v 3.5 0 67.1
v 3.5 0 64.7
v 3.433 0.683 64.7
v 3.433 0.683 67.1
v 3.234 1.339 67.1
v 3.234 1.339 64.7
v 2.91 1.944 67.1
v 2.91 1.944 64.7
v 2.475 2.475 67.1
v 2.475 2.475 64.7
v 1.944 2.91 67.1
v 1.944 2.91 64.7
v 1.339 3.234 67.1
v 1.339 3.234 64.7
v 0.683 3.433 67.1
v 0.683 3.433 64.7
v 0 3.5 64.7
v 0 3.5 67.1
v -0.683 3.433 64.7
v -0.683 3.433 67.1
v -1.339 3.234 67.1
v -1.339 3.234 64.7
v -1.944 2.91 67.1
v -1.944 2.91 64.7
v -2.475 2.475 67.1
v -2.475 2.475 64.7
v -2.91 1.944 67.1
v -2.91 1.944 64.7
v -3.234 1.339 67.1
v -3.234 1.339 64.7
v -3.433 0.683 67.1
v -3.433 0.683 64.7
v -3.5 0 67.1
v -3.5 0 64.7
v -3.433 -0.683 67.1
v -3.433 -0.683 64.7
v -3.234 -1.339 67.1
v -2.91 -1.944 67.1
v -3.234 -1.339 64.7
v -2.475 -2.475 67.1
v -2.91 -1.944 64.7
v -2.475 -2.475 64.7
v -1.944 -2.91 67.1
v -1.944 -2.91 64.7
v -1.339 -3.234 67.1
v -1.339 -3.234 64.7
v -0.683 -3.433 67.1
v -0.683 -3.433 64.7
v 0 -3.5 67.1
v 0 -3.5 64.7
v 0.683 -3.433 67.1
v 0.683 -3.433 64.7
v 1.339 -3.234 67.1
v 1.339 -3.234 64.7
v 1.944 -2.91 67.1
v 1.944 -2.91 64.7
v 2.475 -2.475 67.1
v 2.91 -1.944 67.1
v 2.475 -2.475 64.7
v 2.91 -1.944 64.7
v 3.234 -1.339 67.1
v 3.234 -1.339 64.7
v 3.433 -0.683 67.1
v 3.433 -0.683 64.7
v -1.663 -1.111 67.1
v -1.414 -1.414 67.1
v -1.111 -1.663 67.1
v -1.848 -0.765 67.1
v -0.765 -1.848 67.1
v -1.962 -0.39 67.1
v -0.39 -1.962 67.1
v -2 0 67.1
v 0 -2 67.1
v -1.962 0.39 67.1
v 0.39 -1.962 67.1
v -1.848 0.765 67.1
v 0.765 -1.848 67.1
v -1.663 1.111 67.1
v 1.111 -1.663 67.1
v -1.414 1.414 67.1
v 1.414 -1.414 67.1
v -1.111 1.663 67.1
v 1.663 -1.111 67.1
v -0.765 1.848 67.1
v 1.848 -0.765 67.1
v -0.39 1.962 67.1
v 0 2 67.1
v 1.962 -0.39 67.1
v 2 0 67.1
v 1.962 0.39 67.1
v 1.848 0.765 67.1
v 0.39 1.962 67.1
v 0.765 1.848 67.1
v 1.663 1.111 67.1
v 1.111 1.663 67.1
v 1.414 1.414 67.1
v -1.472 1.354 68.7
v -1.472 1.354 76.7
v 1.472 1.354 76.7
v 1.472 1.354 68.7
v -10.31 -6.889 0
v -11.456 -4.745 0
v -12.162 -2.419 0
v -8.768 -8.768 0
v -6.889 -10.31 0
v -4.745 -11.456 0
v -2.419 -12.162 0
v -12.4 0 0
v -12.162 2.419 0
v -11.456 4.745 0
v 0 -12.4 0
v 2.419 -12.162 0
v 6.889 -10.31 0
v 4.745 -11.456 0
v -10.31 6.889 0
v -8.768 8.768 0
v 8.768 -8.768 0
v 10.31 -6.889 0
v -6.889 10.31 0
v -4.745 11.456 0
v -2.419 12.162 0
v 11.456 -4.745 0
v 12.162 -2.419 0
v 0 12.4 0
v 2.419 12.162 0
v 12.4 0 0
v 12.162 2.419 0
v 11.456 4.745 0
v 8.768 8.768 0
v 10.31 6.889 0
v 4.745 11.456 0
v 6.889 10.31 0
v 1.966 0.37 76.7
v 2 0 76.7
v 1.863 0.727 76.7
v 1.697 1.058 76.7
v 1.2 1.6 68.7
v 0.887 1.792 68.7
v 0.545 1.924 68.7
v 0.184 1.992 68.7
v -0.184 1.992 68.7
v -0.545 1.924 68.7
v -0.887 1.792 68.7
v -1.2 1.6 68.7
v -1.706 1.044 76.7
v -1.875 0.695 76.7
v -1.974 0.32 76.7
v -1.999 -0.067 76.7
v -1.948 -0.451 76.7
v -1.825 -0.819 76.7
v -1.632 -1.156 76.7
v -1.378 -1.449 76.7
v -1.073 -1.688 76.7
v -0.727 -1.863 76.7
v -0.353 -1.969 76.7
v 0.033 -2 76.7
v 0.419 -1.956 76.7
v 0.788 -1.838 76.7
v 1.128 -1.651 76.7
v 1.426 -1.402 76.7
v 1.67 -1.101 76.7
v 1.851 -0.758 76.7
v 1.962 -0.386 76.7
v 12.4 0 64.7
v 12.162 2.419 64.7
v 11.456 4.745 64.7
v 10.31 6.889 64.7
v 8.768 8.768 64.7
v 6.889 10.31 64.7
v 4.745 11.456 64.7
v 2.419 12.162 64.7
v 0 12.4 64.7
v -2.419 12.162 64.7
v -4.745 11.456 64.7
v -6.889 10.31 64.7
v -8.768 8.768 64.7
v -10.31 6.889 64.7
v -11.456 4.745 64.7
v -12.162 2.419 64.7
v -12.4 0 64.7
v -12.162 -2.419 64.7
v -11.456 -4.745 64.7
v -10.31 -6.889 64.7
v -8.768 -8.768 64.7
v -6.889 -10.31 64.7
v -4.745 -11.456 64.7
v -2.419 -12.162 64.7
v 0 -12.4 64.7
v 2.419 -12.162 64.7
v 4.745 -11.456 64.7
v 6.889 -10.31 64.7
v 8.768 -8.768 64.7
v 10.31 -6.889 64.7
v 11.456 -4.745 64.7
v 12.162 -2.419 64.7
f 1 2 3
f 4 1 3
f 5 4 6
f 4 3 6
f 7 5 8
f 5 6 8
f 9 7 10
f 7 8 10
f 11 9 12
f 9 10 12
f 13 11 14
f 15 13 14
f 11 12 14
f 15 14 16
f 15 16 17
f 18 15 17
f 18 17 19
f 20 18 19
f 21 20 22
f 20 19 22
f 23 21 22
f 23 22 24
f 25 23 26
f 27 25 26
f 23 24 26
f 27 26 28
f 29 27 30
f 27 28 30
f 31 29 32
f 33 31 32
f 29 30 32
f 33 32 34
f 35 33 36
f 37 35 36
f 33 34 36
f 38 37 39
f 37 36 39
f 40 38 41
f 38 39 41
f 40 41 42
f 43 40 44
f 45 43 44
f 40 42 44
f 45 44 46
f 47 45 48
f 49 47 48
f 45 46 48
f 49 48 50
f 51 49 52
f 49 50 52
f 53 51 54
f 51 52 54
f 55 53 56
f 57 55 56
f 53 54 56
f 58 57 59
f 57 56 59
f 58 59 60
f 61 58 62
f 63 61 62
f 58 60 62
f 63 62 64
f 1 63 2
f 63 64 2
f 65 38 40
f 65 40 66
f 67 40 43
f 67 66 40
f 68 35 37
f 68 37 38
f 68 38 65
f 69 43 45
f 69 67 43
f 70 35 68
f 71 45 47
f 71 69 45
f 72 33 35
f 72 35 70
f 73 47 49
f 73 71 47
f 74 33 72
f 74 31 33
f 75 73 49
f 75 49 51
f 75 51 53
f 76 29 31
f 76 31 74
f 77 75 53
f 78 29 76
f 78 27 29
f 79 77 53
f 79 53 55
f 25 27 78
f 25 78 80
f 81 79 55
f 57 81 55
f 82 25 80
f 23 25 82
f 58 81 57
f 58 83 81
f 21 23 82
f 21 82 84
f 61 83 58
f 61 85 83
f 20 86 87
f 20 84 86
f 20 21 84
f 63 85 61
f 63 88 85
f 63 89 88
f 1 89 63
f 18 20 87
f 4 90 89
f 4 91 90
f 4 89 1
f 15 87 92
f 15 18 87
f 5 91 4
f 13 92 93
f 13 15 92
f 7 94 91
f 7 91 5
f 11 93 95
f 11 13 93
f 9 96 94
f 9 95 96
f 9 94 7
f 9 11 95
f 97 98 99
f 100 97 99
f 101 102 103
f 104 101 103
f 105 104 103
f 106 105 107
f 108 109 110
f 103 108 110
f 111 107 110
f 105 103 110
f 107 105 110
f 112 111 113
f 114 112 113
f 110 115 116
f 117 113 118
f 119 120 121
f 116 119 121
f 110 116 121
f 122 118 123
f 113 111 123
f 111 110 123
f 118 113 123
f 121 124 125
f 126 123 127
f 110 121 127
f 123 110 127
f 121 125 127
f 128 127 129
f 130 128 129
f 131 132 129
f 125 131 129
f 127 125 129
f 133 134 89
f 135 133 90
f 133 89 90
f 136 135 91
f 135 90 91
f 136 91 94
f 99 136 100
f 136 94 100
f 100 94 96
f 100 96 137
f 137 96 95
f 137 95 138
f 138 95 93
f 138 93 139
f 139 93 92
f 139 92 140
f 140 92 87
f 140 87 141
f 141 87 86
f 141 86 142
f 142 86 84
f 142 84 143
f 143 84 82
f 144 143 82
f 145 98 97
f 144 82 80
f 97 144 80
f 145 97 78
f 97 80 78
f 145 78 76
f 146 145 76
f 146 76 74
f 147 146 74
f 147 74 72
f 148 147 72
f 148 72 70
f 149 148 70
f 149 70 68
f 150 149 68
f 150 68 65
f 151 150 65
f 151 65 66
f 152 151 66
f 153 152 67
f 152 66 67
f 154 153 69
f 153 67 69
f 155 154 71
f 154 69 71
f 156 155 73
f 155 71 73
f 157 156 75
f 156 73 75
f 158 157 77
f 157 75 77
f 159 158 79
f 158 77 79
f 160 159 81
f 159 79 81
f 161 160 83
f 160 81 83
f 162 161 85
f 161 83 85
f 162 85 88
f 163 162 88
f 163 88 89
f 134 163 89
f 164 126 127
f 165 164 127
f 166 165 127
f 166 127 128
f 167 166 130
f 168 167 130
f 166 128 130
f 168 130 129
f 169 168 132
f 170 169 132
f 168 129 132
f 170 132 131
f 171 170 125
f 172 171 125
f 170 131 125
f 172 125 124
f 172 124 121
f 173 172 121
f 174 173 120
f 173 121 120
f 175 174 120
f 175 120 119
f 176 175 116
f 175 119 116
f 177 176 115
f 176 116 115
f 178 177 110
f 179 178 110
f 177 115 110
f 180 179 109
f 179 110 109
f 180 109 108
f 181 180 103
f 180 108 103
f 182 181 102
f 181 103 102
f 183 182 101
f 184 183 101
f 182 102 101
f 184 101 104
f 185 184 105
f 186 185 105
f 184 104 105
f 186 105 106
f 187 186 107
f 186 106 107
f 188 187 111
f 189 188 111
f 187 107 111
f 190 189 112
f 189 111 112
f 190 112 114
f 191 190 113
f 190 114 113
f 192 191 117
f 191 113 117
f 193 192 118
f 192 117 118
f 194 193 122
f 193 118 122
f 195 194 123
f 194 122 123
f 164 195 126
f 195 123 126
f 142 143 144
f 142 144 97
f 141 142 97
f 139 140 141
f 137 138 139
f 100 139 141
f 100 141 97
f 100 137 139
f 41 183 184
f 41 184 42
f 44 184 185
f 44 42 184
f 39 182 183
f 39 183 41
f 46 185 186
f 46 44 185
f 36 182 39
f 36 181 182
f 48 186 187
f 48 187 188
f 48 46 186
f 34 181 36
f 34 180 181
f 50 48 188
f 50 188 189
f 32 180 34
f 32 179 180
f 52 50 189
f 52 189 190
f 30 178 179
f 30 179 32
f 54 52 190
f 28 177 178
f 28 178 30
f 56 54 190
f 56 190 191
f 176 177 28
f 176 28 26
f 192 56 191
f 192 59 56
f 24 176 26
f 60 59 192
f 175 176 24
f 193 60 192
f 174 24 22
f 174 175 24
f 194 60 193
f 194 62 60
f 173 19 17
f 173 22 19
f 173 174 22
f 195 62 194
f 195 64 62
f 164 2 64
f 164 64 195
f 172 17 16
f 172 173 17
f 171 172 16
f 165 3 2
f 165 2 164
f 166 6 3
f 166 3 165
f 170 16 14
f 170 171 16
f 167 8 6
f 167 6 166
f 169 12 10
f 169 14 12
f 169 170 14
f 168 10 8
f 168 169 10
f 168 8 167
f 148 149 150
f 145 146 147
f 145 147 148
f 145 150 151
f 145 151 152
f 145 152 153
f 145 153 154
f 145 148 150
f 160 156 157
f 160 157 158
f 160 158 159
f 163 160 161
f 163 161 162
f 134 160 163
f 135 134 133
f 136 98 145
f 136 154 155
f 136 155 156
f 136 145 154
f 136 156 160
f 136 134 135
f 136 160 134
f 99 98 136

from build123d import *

# Parameters (mm, degrees)
SKETCH1_R           = 12.4
MAIN_EXTRUDE_DEPTH  = 64.7
SKETCH2_R           = 3.5
BOSS_EXTRUDE2_DEPTH = 2.4
SKETCH3_R           = 2
BOSS_EXTRUDE3_DEPTH = 9.6
KEY_CUT_DEPTH       = 8


with BuildPart() as part:
    # Sketch1 → Main Extrude (new body)
    with BuildSketch(Plane.XY):
        Circle(SKETCH1_R)
    extrude(amount=MAIN_EXTRUDE_DEPTH)

    # Sketch2 → Boss-Extrude2 (add)
    with BuildSketch(Plane.XY.offset(64.7)):
        Circle(SKETCH2_R)
    extrude(amount=BOSS_EXTRUDE2_DEPTH)

    # Sketch3 → Boss-Extrude3 (add)
    with BuildSketch(Plane.XY.offset(67.1)):
        Circle(SKETCH3_R)
    extrude(amount=BOSS_EXTRUDE3_DEPTH)

    # Sketch5 → Key Cut (cut)
    with BuildSketch(Plane.XY.offset(76.7)):
        with BuildLine():
            Line((-1.472086844, 1.353868651), (1.472086844, 1.353868651))
            ThreePointArc((1.472086844, 1.353868651), (0, 2), (-1.472086844, 1.353868651))
        make_face()
    extrude(amount=-KEY_CUT_DEPTH, mode=Mode.SUBTRACT)


solid = part.part
